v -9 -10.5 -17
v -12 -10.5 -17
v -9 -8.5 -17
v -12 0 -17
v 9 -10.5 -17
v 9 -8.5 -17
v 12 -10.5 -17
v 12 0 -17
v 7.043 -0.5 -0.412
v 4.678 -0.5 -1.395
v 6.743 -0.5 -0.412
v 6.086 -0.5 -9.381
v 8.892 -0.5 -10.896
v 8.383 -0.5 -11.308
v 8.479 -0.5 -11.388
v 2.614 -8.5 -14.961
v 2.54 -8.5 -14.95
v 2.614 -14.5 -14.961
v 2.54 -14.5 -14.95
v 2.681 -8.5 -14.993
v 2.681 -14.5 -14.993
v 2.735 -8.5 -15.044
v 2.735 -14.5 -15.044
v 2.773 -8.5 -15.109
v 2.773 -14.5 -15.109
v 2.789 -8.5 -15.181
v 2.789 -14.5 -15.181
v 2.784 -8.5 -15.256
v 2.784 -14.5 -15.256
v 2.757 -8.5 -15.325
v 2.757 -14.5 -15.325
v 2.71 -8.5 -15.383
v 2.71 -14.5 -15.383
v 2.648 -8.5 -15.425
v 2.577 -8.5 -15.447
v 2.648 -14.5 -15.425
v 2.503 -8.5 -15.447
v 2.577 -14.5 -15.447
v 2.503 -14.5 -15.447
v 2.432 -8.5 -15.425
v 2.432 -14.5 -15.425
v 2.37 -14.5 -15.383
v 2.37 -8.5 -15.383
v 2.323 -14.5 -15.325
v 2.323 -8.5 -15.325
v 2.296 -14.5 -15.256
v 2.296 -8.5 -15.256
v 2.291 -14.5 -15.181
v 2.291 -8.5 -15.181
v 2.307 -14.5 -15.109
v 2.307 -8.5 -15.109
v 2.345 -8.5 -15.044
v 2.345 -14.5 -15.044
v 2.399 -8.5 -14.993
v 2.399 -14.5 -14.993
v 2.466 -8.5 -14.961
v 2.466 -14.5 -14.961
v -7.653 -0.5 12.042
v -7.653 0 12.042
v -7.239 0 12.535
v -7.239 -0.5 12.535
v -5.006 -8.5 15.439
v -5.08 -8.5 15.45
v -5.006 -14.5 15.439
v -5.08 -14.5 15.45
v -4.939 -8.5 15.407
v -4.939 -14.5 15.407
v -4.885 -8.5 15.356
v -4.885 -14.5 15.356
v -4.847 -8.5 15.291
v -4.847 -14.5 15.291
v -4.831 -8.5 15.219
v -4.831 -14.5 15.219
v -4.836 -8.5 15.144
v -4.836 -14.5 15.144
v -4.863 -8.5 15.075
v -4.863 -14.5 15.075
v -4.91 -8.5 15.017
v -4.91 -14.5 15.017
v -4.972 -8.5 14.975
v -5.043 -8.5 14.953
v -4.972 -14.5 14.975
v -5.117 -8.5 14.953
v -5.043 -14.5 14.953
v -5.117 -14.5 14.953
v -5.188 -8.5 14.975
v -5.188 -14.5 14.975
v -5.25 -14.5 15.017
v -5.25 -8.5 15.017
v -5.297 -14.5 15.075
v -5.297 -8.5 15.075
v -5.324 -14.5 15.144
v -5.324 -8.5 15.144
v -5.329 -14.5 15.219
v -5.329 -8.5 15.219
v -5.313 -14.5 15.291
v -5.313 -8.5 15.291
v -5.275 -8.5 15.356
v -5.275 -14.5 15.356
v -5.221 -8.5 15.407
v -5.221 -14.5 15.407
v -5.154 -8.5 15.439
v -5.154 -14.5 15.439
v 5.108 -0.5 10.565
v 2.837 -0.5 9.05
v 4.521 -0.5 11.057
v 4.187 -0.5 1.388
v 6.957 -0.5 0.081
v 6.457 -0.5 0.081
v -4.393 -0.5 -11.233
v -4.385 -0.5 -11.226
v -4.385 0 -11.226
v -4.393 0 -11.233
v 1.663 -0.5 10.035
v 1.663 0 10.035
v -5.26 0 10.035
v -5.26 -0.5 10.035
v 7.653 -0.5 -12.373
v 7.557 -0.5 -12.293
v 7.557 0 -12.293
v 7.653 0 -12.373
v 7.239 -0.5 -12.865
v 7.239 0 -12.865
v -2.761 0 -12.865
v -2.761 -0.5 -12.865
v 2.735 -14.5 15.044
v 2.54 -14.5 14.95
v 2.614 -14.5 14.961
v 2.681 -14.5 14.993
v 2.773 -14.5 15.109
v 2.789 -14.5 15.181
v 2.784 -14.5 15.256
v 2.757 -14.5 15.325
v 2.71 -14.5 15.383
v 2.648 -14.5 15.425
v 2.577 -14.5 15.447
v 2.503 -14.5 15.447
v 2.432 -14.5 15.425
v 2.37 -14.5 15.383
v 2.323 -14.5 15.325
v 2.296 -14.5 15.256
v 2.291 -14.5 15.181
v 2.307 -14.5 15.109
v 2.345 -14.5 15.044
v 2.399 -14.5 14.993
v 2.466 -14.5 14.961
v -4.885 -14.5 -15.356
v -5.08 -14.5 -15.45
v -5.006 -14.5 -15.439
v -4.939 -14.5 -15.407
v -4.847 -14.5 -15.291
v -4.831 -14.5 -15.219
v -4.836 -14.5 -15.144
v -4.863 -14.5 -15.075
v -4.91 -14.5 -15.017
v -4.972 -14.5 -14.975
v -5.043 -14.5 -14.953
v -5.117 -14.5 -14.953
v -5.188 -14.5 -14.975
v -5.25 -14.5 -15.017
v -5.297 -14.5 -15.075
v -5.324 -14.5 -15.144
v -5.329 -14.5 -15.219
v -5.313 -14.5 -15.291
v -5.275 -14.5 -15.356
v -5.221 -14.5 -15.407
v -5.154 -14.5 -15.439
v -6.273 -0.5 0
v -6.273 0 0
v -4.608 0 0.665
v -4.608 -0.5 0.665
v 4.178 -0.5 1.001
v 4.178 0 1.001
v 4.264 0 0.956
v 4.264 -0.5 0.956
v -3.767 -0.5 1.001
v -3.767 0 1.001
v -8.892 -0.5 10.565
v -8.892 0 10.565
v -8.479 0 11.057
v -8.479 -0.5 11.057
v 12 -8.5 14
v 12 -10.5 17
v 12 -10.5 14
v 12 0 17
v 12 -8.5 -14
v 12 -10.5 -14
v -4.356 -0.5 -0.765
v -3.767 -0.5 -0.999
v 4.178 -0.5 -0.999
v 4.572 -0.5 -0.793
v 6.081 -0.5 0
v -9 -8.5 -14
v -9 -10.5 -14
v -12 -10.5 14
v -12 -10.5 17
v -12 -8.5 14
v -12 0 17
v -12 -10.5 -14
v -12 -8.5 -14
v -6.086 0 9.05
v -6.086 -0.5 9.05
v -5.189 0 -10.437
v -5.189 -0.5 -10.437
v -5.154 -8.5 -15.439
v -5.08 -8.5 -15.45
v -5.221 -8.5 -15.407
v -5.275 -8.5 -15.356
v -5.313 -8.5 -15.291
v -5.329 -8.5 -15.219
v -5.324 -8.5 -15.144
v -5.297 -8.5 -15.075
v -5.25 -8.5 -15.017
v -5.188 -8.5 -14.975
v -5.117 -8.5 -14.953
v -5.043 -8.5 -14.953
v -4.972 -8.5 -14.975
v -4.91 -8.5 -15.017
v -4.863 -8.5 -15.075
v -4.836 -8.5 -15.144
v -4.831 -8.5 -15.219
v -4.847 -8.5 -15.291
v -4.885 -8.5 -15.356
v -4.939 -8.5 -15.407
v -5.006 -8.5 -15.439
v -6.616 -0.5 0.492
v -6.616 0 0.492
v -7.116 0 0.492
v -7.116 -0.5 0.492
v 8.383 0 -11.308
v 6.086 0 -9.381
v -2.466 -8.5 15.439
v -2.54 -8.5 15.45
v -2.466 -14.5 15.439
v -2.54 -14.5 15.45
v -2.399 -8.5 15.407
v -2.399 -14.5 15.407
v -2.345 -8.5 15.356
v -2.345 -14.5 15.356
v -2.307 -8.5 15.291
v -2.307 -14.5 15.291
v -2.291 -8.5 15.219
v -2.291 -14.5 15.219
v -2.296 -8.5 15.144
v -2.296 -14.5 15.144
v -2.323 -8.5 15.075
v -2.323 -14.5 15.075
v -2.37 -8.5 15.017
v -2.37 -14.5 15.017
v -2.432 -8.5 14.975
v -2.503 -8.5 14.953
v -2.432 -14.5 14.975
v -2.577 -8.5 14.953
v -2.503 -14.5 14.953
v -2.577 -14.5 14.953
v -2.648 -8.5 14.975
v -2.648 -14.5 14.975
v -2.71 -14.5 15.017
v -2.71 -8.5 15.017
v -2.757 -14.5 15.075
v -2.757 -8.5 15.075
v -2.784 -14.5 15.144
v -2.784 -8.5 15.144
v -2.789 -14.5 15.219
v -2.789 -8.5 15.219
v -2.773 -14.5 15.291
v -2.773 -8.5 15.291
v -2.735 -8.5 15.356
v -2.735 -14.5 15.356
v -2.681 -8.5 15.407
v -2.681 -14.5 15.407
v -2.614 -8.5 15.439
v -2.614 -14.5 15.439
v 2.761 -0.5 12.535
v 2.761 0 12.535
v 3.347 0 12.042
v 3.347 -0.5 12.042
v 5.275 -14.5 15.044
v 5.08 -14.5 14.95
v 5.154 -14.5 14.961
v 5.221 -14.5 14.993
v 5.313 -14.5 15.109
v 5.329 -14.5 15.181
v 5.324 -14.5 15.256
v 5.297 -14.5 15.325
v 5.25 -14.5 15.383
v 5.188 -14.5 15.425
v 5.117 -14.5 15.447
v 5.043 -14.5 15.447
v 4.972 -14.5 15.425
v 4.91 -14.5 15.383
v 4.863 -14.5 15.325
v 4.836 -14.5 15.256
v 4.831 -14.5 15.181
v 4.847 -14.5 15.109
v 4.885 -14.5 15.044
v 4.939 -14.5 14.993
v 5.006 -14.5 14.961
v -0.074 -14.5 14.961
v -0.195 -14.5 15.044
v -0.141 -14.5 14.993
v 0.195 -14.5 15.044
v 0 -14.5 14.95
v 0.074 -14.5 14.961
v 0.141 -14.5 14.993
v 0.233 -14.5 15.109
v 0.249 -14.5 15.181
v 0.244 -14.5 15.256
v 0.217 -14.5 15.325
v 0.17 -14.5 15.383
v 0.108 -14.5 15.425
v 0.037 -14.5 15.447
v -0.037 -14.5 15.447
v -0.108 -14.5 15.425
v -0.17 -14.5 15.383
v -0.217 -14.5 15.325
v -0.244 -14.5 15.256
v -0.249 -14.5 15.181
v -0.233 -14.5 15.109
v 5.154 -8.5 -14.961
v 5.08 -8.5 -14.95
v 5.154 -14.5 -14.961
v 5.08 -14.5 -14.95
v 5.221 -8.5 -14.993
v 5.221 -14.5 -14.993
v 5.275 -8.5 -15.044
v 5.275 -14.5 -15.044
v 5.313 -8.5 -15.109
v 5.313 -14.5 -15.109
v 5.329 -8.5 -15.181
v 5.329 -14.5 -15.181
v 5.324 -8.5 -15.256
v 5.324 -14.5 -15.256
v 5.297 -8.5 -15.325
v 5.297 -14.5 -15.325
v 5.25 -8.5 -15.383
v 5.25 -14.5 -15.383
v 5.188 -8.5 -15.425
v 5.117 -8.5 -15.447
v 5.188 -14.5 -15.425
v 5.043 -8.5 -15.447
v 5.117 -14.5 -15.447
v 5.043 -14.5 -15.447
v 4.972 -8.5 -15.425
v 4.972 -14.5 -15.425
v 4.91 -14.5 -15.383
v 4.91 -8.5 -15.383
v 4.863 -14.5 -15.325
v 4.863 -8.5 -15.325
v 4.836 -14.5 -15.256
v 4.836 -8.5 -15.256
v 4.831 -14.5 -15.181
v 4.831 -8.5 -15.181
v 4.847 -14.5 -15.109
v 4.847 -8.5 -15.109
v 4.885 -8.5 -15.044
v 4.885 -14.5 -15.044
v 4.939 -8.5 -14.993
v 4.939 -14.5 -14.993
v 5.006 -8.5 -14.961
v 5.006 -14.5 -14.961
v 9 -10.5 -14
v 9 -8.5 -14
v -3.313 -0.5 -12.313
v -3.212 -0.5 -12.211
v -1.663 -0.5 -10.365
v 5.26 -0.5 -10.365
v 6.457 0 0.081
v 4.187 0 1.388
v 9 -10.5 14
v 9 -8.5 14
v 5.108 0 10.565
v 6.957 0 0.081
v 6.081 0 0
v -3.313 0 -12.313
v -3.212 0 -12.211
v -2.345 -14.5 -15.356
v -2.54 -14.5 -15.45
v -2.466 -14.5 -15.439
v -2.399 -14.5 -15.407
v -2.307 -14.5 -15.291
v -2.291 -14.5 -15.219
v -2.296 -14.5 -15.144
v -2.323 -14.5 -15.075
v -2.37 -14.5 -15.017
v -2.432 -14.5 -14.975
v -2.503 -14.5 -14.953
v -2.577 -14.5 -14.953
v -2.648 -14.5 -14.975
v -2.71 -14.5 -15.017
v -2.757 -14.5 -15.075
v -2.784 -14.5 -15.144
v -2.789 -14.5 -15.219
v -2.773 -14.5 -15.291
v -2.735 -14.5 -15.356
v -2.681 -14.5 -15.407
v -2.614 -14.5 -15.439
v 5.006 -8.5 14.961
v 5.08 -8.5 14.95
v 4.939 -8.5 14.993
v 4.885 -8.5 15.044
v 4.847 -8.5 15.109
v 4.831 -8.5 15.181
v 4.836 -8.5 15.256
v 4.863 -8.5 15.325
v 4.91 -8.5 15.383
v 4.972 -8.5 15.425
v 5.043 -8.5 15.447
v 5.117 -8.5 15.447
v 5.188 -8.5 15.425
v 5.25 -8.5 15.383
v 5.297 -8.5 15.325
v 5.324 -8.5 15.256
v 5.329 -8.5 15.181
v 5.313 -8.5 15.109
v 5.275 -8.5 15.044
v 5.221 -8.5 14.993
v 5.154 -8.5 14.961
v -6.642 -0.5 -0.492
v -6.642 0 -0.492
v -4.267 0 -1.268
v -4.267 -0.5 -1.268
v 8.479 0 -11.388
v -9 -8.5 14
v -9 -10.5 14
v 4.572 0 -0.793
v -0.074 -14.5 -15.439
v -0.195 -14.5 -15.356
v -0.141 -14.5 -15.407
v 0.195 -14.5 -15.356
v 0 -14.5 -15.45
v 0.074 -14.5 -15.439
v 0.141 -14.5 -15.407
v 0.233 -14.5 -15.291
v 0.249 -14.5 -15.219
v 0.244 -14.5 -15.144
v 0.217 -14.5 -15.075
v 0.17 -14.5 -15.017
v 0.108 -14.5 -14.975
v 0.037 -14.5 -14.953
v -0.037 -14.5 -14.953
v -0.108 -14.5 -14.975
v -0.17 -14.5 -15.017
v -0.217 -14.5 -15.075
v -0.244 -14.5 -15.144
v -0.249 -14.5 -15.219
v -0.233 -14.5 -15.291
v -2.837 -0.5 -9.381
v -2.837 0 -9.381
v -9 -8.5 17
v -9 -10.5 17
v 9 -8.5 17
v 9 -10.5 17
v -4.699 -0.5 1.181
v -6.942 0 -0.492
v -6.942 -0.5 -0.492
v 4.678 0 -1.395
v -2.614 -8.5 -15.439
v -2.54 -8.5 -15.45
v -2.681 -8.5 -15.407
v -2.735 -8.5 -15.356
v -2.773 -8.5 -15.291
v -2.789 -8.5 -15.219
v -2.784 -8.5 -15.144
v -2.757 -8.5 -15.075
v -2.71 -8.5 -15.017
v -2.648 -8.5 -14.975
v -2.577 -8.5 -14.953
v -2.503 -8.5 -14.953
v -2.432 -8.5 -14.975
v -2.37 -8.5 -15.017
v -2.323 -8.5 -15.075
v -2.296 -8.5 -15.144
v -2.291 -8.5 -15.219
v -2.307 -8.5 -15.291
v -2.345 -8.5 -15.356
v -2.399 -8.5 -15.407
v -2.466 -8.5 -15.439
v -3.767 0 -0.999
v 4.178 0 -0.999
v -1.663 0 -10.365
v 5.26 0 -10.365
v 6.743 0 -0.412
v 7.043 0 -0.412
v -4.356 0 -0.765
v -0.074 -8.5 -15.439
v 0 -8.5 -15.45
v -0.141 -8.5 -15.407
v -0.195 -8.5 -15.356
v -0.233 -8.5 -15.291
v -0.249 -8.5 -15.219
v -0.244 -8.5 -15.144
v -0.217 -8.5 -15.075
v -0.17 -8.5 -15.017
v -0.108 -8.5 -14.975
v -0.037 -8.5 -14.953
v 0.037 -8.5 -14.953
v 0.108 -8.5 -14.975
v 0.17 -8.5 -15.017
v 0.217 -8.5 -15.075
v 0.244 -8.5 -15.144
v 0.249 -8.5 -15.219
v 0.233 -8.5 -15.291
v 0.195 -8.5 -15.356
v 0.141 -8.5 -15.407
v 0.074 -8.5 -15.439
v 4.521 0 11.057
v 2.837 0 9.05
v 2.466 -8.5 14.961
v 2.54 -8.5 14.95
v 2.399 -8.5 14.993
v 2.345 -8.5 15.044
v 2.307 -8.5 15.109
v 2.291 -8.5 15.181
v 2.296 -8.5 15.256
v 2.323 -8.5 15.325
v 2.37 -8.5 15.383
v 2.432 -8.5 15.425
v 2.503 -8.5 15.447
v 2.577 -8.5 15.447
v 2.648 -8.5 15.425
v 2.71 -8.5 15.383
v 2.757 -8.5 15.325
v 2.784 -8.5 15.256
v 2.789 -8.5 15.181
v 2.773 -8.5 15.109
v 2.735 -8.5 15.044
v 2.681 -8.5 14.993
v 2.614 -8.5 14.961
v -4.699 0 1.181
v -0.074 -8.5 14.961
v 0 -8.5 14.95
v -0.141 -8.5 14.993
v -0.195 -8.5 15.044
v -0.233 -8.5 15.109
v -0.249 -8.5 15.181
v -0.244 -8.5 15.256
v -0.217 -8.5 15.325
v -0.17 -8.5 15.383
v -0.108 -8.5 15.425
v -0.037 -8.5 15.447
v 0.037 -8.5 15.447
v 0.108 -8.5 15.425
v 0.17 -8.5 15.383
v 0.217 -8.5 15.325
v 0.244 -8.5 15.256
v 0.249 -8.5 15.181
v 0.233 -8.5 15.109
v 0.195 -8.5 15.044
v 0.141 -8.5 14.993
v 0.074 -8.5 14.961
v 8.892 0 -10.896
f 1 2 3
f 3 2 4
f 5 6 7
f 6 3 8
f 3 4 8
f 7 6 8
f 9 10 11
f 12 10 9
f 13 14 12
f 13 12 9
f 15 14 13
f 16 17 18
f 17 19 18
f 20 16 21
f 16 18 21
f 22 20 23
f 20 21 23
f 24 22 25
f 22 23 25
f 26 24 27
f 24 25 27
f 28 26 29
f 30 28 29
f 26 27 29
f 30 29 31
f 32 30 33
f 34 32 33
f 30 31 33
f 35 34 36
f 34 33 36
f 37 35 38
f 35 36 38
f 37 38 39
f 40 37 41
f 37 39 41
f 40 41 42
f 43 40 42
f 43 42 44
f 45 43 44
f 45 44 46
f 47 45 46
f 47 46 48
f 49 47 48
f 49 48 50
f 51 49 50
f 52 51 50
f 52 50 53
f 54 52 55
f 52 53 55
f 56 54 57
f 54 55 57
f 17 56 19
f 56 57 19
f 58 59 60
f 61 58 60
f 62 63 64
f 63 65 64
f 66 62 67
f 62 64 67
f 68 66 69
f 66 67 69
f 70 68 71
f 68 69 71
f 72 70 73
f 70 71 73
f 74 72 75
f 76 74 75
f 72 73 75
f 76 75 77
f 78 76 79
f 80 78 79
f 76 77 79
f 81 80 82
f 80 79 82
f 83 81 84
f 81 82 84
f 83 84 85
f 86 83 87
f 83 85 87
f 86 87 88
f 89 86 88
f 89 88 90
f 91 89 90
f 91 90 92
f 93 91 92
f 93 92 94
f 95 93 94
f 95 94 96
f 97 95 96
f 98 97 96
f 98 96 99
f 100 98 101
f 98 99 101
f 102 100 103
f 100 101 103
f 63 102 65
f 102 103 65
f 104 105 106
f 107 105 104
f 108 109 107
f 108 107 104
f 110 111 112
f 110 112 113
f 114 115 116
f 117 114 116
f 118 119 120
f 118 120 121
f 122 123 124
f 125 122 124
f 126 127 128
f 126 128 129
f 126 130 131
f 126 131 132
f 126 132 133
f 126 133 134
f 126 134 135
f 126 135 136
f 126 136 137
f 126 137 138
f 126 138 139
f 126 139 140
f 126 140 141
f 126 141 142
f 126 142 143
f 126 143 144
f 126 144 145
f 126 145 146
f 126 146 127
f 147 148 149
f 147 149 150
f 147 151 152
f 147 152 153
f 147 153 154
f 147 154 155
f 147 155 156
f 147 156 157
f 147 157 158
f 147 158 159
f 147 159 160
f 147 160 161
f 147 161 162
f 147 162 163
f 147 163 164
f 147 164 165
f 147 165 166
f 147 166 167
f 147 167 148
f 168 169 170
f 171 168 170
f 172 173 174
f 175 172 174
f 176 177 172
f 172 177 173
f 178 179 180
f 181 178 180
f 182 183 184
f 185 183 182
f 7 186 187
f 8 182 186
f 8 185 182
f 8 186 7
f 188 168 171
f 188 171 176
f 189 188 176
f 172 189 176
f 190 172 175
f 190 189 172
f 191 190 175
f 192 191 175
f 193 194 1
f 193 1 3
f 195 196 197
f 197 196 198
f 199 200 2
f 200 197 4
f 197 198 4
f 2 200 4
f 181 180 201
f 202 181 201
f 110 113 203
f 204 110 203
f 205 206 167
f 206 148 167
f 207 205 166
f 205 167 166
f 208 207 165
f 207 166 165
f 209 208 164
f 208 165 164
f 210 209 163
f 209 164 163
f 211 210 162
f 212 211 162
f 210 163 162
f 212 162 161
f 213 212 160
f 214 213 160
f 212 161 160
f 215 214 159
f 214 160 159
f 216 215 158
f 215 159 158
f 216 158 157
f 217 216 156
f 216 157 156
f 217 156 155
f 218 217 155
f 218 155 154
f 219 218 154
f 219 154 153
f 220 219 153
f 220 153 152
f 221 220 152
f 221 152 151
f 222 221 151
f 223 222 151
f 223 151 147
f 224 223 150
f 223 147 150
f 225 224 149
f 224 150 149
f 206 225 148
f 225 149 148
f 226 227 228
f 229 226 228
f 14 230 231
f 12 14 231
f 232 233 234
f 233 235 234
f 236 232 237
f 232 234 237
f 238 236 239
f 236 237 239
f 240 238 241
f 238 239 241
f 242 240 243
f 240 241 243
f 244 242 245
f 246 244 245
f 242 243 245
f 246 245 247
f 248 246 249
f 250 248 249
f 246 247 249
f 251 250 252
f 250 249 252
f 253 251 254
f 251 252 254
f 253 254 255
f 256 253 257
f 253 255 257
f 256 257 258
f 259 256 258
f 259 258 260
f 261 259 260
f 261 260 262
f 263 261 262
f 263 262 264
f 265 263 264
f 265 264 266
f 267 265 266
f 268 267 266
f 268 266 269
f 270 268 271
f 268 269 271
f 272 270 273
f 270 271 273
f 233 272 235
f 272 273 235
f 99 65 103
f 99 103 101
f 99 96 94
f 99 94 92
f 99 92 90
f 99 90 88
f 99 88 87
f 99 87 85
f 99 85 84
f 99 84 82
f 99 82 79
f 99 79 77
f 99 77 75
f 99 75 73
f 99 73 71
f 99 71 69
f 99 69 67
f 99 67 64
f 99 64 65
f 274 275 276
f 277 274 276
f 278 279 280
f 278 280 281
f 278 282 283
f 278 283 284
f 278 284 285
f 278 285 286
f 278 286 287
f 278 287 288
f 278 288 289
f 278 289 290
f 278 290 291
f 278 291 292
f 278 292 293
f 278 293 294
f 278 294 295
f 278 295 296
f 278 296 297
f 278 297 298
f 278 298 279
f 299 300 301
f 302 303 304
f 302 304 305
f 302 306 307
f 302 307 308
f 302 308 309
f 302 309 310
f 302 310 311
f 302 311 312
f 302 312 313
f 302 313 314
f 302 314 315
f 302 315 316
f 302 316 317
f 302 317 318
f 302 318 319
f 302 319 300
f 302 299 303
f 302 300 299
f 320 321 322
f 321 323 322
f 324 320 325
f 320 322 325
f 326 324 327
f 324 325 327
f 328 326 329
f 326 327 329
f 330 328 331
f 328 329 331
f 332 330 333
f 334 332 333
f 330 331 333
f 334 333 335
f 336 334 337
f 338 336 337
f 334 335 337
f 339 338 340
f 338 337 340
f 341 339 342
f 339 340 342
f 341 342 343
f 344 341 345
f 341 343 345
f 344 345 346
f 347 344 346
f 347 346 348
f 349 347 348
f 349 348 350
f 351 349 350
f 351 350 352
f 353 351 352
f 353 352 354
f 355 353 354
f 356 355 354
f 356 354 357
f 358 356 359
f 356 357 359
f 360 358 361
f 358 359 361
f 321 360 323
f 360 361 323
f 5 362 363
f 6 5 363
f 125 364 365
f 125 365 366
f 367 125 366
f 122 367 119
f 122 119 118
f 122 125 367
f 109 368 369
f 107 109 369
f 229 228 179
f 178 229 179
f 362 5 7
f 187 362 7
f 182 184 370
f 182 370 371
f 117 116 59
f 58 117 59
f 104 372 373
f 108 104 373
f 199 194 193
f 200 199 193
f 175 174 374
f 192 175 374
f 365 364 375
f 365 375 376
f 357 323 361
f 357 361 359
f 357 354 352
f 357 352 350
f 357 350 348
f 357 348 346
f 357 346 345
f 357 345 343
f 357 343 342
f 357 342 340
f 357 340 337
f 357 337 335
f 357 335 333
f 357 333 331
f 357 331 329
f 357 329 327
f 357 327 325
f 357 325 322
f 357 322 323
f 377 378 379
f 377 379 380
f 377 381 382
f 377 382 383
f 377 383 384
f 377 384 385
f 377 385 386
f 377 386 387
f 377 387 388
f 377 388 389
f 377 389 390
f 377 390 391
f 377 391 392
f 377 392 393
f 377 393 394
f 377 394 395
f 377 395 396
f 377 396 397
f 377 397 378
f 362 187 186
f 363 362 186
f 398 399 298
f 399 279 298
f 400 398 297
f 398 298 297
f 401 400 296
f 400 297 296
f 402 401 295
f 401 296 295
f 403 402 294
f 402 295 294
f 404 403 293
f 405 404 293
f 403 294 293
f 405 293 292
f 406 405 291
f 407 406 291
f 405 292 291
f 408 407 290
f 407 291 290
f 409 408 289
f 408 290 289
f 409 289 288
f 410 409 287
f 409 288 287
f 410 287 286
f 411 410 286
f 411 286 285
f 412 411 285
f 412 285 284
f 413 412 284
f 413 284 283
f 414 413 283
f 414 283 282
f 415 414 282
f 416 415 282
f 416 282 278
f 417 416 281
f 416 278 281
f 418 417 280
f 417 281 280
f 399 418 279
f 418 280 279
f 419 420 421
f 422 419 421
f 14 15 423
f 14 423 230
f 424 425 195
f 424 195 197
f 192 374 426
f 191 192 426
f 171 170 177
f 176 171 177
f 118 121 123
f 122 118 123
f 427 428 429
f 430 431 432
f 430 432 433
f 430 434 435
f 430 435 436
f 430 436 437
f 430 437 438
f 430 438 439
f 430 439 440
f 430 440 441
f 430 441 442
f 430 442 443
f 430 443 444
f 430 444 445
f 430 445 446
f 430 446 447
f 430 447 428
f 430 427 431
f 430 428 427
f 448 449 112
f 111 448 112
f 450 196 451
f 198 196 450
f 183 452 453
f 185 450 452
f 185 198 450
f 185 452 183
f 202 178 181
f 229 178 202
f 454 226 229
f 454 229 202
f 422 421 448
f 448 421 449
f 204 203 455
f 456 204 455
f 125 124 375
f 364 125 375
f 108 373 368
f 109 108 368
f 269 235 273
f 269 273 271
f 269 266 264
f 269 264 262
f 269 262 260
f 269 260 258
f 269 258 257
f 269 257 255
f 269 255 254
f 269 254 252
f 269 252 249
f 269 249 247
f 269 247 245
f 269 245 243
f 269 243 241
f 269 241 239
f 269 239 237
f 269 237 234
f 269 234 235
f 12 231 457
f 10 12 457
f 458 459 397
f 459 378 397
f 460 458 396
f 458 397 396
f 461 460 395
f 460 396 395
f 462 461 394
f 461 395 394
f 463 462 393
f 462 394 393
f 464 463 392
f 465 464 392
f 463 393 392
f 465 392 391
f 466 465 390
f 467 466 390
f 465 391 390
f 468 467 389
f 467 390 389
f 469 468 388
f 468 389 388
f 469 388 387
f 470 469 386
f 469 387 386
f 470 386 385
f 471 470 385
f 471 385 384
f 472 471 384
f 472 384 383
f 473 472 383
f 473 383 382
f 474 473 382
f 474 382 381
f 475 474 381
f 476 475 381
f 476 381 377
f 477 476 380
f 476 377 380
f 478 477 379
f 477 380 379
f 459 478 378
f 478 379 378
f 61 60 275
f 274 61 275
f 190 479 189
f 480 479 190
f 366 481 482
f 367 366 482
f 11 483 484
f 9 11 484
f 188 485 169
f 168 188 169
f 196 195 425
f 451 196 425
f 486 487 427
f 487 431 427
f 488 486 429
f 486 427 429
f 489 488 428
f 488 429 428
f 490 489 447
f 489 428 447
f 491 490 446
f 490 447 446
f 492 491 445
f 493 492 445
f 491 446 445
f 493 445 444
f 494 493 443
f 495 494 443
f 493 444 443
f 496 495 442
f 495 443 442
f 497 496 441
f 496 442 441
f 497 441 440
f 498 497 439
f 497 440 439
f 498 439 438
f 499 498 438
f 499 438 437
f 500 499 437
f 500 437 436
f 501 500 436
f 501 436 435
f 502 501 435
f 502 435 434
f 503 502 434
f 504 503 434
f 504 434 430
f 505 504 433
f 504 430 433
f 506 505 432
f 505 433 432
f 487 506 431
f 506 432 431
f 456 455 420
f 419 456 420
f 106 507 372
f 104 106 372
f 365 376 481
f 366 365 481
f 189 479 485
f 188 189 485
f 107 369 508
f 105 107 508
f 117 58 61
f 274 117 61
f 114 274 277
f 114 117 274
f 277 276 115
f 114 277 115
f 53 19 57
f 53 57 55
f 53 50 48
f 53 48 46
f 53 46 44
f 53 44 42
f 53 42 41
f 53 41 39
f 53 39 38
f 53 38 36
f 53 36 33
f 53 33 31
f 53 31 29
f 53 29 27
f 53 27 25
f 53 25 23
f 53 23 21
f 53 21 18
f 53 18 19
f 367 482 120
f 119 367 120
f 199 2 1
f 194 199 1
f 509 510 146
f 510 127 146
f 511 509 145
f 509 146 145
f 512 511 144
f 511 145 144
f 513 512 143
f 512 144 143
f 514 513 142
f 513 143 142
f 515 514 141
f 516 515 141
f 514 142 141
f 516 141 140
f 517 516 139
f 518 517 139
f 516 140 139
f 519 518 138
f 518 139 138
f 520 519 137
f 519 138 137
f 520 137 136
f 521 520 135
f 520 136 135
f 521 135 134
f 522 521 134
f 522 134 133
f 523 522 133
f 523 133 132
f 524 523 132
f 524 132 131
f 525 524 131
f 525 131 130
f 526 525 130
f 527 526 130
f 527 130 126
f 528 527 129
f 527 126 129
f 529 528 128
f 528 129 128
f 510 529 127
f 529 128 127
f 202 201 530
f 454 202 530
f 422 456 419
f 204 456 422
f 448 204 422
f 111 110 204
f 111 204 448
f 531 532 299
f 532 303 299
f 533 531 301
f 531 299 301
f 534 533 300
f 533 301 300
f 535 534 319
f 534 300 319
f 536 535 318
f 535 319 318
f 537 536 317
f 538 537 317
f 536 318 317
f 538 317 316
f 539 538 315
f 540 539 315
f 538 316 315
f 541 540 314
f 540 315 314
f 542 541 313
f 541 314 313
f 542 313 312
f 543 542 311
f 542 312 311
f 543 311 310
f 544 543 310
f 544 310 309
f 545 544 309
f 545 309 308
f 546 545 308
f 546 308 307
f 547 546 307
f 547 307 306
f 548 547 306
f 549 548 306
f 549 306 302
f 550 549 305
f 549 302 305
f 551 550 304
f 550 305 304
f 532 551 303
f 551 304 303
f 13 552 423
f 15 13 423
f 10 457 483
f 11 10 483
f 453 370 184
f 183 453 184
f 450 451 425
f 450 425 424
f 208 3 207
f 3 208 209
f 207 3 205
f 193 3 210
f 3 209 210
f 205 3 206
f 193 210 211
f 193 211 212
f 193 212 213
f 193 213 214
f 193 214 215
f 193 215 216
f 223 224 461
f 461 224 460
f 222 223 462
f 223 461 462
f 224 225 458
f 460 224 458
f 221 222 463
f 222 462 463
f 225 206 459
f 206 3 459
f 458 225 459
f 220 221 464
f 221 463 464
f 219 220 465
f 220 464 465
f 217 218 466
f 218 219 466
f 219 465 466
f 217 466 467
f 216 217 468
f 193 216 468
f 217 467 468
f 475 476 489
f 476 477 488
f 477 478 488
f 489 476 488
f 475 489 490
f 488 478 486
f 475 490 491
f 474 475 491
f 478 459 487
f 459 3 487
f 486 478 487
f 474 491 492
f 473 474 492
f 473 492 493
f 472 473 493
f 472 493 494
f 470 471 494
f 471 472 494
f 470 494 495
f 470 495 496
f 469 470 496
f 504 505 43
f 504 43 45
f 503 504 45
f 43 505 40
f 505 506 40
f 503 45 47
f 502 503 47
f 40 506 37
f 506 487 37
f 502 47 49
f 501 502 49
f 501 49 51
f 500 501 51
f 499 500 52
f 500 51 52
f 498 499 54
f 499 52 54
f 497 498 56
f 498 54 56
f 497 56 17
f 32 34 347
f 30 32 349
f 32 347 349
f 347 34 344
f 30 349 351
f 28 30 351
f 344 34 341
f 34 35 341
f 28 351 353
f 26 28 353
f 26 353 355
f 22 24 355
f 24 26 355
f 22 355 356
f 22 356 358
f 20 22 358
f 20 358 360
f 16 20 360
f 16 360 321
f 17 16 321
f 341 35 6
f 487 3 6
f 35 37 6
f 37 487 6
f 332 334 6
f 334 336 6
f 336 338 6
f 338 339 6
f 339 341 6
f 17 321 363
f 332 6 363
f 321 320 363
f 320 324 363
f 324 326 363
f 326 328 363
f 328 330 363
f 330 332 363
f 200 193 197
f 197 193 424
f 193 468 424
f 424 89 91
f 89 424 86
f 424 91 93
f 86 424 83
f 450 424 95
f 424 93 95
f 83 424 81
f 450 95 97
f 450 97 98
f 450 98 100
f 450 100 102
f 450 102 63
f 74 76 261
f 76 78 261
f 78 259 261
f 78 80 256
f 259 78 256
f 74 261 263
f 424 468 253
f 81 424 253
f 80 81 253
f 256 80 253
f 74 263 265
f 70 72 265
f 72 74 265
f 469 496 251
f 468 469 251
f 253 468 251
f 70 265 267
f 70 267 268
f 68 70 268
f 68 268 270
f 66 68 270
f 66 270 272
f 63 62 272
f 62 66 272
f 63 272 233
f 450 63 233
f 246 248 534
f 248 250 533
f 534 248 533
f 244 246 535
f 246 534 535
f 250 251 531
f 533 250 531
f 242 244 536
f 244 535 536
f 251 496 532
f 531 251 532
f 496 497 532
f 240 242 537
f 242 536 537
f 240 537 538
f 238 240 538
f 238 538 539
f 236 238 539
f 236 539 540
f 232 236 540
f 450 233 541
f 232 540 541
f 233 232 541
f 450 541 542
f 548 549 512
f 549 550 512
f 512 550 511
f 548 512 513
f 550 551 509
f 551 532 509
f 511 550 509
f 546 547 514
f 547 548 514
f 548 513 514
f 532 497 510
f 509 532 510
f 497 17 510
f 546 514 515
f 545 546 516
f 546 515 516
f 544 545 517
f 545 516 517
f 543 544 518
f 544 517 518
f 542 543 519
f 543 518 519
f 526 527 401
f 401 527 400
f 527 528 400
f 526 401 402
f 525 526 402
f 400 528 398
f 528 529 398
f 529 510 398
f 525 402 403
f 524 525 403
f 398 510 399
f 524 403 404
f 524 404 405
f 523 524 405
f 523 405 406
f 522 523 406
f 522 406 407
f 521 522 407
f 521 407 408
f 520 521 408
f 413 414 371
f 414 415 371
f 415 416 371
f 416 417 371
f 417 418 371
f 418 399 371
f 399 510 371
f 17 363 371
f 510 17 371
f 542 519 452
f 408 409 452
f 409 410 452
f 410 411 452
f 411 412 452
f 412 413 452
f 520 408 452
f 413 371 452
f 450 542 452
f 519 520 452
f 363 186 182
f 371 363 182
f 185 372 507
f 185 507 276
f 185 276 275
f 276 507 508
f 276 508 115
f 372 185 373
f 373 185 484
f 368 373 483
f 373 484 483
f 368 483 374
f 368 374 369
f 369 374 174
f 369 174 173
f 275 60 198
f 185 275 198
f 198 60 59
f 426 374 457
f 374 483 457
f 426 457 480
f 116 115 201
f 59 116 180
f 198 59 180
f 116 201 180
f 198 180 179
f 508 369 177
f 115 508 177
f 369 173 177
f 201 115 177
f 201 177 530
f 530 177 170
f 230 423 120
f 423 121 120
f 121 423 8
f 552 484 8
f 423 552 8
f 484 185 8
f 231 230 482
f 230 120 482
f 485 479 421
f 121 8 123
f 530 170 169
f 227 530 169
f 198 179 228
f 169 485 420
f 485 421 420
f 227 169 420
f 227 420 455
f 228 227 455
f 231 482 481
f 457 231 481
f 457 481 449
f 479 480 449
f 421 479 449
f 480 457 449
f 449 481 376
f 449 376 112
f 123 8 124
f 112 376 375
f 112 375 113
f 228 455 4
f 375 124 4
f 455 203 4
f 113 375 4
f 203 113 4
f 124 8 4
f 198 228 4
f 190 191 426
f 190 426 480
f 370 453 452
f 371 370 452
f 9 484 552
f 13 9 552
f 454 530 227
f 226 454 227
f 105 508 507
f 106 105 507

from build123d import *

# Parameters (mm, degrees)
SKETCH1_W           = 24
SKETCH1_H           = 34
BOSS_EXTRUDE1_DEPTH = 10.5
SKETCH3_R           = 0.25
BOSS_EXTRUDE2_DEPTH = 4
SKETCH4_W           = 14
SKETCH4_H           = 2
CUT_EXTRUDE1_DEPTH  = 30
SKETCH5_W           = 9
SKETCH5_H           = 2
CUT_EXTRUDE2_DEPTH  = 43
SKETCH6_R           = 0.25
BOSS_EXTRUDE3_DEPTH = 2
SKETCH7_W           = 7.945226129
SKETCH7_H           = 2
CUT_EXTRUDE3_DEPTH  = 0.5
BOSS_EXTRUDE4_DEPTH = 0.5


with BuildPart() as part:
    # Sketch1 → Boss-Extrude1 (new body)
    with BuildSketch(Plane(origin=(0, 0, 0), x_dir=(1, 0, 0), z_dir=(0, 1, 0))):
        Rectangle(SKETCH1_W, SKETCH1_H)
    extrude(amount=-BOSS_EXTRUDE1_DEPTH)

    # Sketch3 → Boss-Extrude2 (add)
    with BuildSketch(Plane.XZ.offset(10.5)):
        with Locations(Location((0, 15.2, 0), (0, 0, 270))):
            Circle(SKETCH3_R)
        with Locations(Location((0, -15.2, 0), (0, 0, 270))):
            Circle(SKETCH3_R)
        with Locations(Location((2.54, 15.2, 0), (0, 0, 270))):
            Circle(SKETCH3_R)
        with Locations(Location((5.08, 15.2, 0), (0, 0, 270))):
            Circle(SKETCH3_R)
        with Locations(Location((-2.54, 15.2, 0), (0, 0, 90))):
            Circle(SKETCH3_R)
        with Locations(Location((-5.08, 15.2, 0), (0, 0, 90))):
            Circle(SKETCH3_R)
        with Locations(Location((-5.08, -15.2, 0), (0, 0, 270))):
            Circle(SKETCH3_R)
        with Locations(Location((-2.54, -15.2, 0), (0, 0, 270))):
            Circle(SKETCH3_R)
        with Locations(Location((2.54, -15.2, 0), (0, 0, 90))):
            Circle(SKETCH3_R)
        with Locations(Location((5.08, -15.2, 0), (0, 0, 90))):
            Circle(SKETCH3_R)
    extrude(amount=BOSS_EXTRUDE2_DEPTH)

    # Sketch4 → Cut-Extrude1 (cut)
    with BuildSketch(Plane(origin=(12, 0, 0), x_dir=(0, 0, -1), z_dir=(1, 0, 0))):
        with Locations((-7, -9.5)):
            Rectangle(SKETCH4_W, SKETCH4_H)
        with Locations((7, -9.5)):
            Rectangle(SKETCH4_W, SKETCH4_H)
    extrude(amount=-CUT_EXTRUDE1_DEPTH, mode=Mode.SUBTRACT)

    # Sketch5 → Cut-Extrude2 (cut)
    with BuildSketch(Plane.XY.offset(17)):
        with Locations((4.5, -9.5)):
            Rectangle(SKETCH5_W, SKETCH5_H)
        with Locations((-4.5, -9.5)):
            Rectangle(SKETCH5_W, SKETCH5_H)
    extrude(amount=-CUT_EXTRUDE2_DEPTH, mode=Mode.SUBTRACT)


with BuildPart() as cut_extrude2_piece_1:
    # of the separate pieces the step leaves, piece 1, a body of its own (cut_extrude2_pieces)
    add(part.part.solids().sort_by_distance((-12, 0, -17))[0])



with BuildPart() as cut_extrude2_piece_2:
    # of the separate pieces the step leaves, piece 2, a body of its own (cut_extrude2_pieces)
    add(part.part.solids().sort_by_distance((5.08, -10.5, -14.95))[0])


with BuildPart() as cut_extrude2_piece_3:
    # of the separate pieces the step leaves, piece 3, a body of its own (cut_extrude2_pieces)
    add(part.part.solids().sort_by_distance((-5.08, -10.5, -15.45))[0])


with BuildPart() as cut_extrude2_piece_4:
    # of the separate pieces the step leaves, piece 4, a body of its own (cut_extrude2_pieces)
    add(part.part.solids().sort_by_distance((5.08, -10.5, 14.95))[0])


with BuildPart() as cut_extrude2_piece_5:
    # of the separate pieces the step leaves, piece 5, a body of its own (cut_extrude2_pieces)
    add(part.part.solids().sort_by_distance((-5.08, -10.5, 15.45))[0])


with BuildPart() as cut_extrude2_piece_6:
    # of the separate pieces the step leaves, piece 6, a body of its own (cut_extrude2_pieces)
    add(part.part.solids().sort_by_distance((0, -10.5, -15.45))[0])


with BuildPart() as cut_extrude2_piece_7:
    # of the separate pieces the step leaves, piece 7, a body of its own (cut_extrude2_pieces)
    add(part.part.solids().sort_by_distance((2.54, -10.5, -14.95))[0])


with BuildPart() as cut_extrude2_piece_8:
    # of the separate pieces the step leaves, piece 8, a body of its own (cut_extrude2_pieces)
    add(part.part.solids().sort_by_distance((-2.54, -10.5, -15.45))[0])


with BuildPart() as cut_extrude2_piece_9:
    # of the separate pieces the step leaves, piece 9, a body of its own (cut_extrude2_pieces)
    add(part.part.solids().sort_by_distance((0, -10.5, 14.95))[0])


with BuildPart() as cut_extrude2_piece_10:
    # of the separate pieces the step leaves, piece 10, a body of its own (cut_extrude2_pieces)
    add(part.part.solids().sort_by_distance((2.54, -10.5, 14.95))[0])


with BuildPart() as cut_extrude2_piece_11:
    # of the separate pieces the step leaves, piece 11, a body of its own (cut_extrude2_pieces)
    add(part.part.solids().sort_by_distance((-2.54, -10.5, 15.45))[0])


with BuildPart() as cut_extrude2_piece_1_1:
    add(cut_extrude2_piece_1.part)

    add(cut_extrude2_piece_2.part)  # Boss-Extrude3 merges Cut-Extrude2 piece 2

    add(cut_extrude2_piece_3.part)  # Boss-Extrude3 merges Cut-Extrude2 piece 3

    add(cut_extrude2_piece_4.part)  # Boss-Extrude3 merges Cut-Extrude2 piece 4

    add(cut_extrude2_piece_5.part)  # Boss-Extrude3 merges Cut-Extrude2 piece 5

    add(cut_extrude2_piece_6.part)  # Boss-Extrude3 merges Cut-Extrude2 piece 6

    add(cut_extrude2_piece_7.part)  # Boss-Extrude3 merges Cut-Extrude2 piece 7

    add(cut_extrude2_piece_8.part)  # Boss-Extrude3 merges Cut-Extrude2 piece 8

    add(cut_extrude2_piece_9.part)  # Boss-Extrude3 merges Cut-Extrude2 piece 9

    add(cut_extrude2_piece_10.part)  # Boss-Extrude3 merges Cut-Extrude2 piece 10

    add(cut_extrude2_piece_11.part)  # Boss-Extrude3 merges Cut-Extrude2 piece 11
    # Sketch6 → Boss-Extrude3 (add)
    with BuildSketch(Plane(origin=(0, -10.5, 0), x_dir=(1, 0, 0), z_dir=(0, 1, 0))):
        with Locations(Location((0, -15.2, 0), (0, 0, 90))):
            Circle(SKETCH6_R)
        with Locations(Location((2.54, -15.2, 0), (0, 0, 90))):
            Circle(SKETCH6_R)
        with Locations(Location((5.08, -15.2, 0), (0, 0, 90))):
            Circle(SKETCH6_R)
        with Locations(Location((-5.08, -15.2, 0), (0, 0, 270))):
            Circle(SKETCH6_R)
        with Locations(Location((-2.54, -15.2, 0), (0, 0, 270))):
            Circle(SKETCH6_R)
        with Locations(Location((5.08, 15.2, 0), (0, 0, 270))):
            Circle(SKETCH6_R)
        with Locations(Location((2.54, 15.2, 0), (0, 0, 270))):
            Circle(SKETCH6_R)
        with Locations(Location((0, 15.2, 0), (0, 0, 90))):
            Circle(SKETCH6_R)
        with Locations(Location((-2.54, 15.2, 0), (0, 0, 90))):
            Circle(SKETCH6_R)
        with Locations(Location((-5.08, 15.2, 0), (0, 0, 90))):
            Circle(SKETCH6_R)
    extrude(amount=BOSS_EXTRUDE3_DEPTH)

    # Sketch7 → Cut-Extrude3 (cut)
    with BuildSketch(Plane(origin=(0, 0, 0), x_dir=(1, 0, 0), z_dir=(0, 1, 0))):
        Polygon((-5.188795352, 10.437162232), (-6.942324566, 0.492403877), (-6.642324566, 0.492403877), (-4.266955967, 1.26824697), (-2.836546445, 9.380502486), (-4.385166656, 11.226076186), (-3.211518478, 12.210883939), (-1.662898267, 10.365310239), (5.259968674, 10.365310239), (7.55683761, 12.292612116), (8.383189432, 11.307804363), (6.086320496, 9.380502486), (4.678270162, 1.395052228), (6.743412044, 0.411512177), (7.043412044, 0.411512177), (8.8920563, 10.895694733), (7.239352655, 12.865310239), (-2.760647345, 12.865310239), align=None)
        Polygon((-8.8920563, -10.565074255), (-8.478880388, -11.057478132), (-6.086320496, -9.049882008), (-4.698885284, -1.181345914), (-6.615972744, -0.492403877), (-7.115972744, -0.492403877), align=None)
        Polygon((-7.652528566, -12.042285885), (-7.239352655, -12.534689761), (2.760647345, -12.534689761), (3.347471434, -12.042285885), (1.662898267, -10.034689761), (-5.259968674, -10.034689761), align=None)
        Polygon((2.836546445, -9.049882008), (4.521119612, -11.057478132), (5.1079437, -10.565074255), (6.956587956, -0.080891699), (6.456587956, -0.080891699), (4.187465262, -1.388440678), align=None)
        with Locations((0.205657098, -0.000503087)):
            Rectangle(SKETCH7_W, SKETCH7_H)
        Polygon((-4.355746064, 0.764693302), (-4.607811486, -0.664840738), (-3.766955967, -1.000503087), (-3.766955967, 0.999496913), align=None)
        Polygon((-6.273279795, 0), (-4.607811486, -0.664840738), (-4.355746064, 0.764693302), align=None)
        Polygon((4.178270162, -1.000503087), (4.263800752, -0.955520605), (4.57204349, 0.792610834), (4.178270162, 0.999496913), align=None)
        Polygon((4.57204349, 0.792610834), (4.263800752, -0.955520605), (6.080646714, 0), align=None)
    extrude(amount=-CUT_EXTRUDE3_DEPTH, mode=Mode.SUBTRACT)

    # Sketch8 → Boss-Extrude4 (add)
    with BuildSketch(Plane(origin=(0, -0.5, 0), x_dir=(1, 0, 0), z_dir=(0, 1, 0))):
        Polygon((7.55683761, 12.292612116), (7.652528566, 12.372906362), (8.478880388, 11.388098609), (8.383189432, 11.307804363), align=None)
        Polygon((-4.385166656, 11.226076186), (-4.392524027, 11.233433557), (-3.313296062, 12.312661522), (-3.211518478, 12.210883939), align=None)
    extrude(amount=BOSS_EXTRUDE4_DEPTH)


solid = cut_extrude2_piece_1_1.part
